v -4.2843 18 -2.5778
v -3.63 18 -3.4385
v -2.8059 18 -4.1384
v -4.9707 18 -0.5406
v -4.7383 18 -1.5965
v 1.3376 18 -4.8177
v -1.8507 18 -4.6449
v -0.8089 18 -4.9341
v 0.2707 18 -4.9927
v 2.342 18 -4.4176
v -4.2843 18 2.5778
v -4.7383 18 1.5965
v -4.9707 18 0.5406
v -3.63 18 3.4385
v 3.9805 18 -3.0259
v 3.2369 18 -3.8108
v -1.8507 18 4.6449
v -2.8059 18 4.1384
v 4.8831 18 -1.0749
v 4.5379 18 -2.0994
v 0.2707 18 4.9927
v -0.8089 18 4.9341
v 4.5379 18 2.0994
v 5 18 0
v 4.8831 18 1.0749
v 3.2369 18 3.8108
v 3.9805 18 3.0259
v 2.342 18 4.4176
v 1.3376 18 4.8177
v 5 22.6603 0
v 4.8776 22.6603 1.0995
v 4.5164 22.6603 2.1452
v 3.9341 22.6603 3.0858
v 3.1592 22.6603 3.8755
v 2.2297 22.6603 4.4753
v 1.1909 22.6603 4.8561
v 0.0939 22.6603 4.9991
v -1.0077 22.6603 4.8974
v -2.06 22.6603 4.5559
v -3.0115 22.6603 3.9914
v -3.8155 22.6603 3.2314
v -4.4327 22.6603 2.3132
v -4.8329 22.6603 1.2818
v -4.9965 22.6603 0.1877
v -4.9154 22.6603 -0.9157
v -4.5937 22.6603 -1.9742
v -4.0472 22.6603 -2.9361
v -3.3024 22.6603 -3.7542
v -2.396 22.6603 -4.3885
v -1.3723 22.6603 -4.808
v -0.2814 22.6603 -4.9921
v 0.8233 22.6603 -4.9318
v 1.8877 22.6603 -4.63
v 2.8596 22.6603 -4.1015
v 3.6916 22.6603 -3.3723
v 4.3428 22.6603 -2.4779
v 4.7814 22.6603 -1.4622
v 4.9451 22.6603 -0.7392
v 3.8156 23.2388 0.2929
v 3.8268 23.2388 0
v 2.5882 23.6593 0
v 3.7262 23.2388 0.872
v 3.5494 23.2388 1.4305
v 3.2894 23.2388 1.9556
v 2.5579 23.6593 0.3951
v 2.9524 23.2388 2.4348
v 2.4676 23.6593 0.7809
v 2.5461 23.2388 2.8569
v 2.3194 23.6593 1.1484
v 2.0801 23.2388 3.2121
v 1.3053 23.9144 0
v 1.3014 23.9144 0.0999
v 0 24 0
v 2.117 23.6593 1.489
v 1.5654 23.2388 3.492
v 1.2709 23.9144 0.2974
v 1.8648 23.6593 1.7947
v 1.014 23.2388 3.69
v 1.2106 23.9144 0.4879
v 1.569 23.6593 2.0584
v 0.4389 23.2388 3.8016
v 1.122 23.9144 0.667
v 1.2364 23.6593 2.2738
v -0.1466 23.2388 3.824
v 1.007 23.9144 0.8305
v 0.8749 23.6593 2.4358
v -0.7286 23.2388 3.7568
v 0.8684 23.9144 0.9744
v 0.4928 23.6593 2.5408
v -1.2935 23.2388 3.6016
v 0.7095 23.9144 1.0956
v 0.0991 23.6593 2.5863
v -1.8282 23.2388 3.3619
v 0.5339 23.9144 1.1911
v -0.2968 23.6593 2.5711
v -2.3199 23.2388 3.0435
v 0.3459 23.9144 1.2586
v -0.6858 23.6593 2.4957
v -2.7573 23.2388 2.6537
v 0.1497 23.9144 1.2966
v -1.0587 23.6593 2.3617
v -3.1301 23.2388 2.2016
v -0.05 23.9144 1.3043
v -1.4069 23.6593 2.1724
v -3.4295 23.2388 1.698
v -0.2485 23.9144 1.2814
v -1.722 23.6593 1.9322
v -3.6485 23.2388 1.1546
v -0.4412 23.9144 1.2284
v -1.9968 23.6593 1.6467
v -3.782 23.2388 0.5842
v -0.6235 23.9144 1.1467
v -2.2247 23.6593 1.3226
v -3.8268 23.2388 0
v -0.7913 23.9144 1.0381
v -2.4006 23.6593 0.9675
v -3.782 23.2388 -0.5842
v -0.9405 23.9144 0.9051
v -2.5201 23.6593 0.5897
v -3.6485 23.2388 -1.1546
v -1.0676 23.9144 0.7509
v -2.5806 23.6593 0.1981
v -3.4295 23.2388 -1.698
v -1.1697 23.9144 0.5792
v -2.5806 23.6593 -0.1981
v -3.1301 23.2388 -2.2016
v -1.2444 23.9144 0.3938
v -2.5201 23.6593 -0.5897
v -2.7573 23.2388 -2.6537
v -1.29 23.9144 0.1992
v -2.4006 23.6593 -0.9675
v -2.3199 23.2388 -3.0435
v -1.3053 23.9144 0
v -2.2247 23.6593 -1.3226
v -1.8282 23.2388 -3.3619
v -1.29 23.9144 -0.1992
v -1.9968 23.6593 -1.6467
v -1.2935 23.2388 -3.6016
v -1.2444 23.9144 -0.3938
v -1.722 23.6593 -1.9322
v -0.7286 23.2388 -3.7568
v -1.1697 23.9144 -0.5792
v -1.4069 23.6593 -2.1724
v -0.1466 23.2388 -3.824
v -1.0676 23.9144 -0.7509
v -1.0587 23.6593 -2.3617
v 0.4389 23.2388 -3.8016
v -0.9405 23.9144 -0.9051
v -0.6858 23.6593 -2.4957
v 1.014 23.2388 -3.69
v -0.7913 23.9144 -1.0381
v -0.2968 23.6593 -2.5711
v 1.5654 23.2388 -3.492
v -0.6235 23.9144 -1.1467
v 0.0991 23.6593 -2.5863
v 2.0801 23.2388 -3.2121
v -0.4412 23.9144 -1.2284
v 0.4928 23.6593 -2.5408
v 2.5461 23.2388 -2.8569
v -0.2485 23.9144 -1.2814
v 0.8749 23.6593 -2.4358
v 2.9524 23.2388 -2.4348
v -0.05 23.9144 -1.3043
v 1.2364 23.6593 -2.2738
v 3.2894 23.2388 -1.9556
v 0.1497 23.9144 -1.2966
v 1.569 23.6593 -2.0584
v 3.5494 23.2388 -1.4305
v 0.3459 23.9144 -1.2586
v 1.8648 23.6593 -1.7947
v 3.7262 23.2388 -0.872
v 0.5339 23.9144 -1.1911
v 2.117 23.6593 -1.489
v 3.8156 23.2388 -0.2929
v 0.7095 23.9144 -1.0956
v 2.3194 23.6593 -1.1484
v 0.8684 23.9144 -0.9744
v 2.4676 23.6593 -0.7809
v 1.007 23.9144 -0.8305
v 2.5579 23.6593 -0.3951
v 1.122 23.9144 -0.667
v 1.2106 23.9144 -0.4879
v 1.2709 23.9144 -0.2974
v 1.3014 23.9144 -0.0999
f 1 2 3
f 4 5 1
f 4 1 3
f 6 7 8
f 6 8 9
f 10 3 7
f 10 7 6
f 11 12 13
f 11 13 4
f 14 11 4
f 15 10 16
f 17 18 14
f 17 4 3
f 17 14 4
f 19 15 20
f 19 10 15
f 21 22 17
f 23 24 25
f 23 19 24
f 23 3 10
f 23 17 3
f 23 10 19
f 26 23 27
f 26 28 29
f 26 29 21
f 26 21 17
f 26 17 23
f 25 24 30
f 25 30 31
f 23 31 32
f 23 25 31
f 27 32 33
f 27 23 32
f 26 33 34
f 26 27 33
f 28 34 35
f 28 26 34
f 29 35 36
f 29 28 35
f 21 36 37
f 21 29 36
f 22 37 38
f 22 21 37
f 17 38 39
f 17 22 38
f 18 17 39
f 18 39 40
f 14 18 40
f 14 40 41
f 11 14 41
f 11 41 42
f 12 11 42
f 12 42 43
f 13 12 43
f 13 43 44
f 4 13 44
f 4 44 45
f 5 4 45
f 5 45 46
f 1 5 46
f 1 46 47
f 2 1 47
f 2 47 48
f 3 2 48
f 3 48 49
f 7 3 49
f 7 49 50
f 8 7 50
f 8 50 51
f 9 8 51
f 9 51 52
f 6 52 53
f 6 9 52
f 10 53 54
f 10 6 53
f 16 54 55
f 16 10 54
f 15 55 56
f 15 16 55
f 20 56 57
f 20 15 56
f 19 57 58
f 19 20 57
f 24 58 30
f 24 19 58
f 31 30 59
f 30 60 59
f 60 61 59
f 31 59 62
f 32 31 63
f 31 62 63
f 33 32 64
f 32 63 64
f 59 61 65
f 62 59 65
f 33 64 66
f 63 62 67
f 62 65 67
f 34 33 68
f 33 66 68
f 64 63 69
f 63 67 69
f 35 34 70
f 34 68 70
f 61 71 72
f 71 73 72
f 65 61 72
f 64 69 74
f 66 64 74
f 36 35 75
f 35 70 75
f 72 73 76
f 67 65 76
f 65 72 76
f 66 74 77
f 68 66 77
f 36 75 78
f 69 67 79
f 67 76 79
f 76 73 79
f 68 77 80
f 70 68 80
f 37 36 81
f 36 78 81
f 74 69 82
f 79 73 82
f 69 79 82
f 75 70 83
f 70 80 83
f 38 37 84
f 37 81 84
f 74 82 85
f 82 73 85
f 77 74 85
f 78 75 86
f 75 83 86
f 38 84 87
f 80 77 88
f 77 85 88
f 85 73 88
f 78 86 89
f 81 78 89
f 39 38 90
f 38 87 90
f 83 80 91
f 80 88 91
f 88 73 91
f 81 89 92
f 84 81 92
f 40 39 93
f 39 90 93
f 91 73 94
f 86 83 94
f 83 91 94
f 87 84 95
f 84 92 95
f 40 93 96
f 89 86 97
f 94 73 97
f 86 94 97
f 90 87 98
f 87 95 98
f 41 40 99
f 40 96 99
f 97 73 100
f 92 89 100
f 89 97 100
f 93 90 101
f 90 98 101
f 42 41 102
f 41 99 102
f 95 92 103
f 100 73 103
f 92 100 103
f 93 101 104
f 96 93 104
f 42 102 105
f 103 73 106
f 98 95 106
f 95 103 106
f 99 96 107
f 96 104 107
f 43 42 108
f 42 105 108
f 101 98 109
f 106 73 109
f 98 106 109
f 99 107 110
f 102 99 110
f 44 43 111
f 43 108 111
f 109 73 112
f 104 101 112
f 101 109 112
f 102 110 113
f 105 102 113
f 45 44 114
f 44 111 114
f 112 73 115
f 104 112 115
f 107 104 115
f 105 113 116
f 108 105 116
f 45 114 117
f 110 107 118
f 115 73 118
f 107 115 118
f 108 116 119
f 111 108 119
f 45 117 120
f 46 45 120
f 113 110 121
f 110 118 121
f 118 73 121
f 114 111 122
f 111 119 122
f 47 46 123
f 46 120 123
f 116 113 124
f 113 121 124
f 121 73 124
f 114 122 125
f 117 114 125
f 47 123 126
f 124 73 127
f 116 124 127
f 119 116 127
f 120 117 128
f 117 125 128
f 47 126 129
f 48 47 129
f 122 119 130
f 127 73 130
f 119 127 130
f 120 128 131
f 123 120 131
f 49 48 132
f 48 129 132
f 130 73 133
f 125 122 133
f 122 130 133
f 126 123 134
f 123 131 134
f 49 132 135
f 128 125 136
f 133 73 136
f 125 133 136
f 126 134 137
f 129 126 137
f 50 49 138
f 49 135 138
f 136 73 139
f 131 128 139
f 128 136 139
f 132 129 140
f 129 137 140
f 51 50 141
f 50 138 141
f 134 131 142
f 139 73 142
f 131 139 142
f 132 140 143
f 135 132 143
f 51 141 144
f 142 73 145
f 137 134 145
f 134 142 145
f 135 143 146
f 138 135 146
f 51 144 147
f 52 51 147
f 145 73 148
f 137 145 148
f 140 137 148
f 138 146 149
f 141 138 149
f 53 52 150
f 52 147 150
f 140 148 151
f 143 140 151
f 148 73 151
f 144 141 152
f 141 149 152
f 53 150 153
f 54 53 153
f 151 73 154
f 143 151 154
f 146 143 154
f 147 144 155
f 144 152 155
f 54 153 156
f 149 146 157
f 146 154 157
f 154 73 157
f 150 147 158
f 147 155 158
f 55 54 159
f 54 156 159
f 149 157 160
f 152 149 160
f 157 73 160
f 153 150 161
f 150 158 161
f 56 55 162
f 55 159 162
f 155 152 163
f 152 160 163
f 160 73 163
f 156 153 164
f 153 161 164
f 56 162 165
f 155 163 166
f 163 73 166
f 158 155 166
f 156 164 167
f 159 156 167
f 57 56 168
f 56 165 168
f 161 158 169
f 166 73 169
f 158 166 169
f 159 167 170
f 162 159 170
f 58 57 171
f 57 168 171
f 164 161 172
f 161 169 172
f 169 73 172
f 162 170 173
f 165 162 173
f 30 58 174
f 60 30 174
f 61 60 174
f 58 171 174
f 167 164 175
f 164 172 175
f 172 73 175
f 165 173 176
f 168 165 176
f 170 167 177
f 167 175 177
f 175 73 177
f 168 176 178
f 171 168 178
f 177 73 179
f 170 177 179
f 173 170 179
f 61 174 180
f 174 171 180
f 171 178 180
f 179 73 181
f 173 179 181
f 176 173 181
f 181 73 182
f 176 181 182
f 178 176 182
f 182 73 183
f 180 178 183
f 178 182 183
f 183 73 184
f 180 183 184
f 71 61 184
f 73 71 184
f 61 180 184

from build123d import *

# Parameters (mm, degrees)
SKETCH2_R           = 5
BOSS_EXTRUDE1_DEPTH = 8
SKETCH4_R           = 23.702642413
SKETCH4_R_2         = 5
CUT_EXTRUDE1_DEPTH  = 28
SKETCH5_R           = 5
CUT_EXTRUDE2_DEPTH  = 18


with BuildPart() as part:
    # Sketch2 → Boss-Extrude1 (new body)
    with BuildSketch(Plane(origin=(0, 0, 0), x_dir=(1, 0, 0), z_dir=(0, 1, 0))):
        Circle(SKETCH2_R)
    extrude(amount=BOSS_EXTRUDE1_DEPTH)

    # Sketch3 one side → Revolve1 (revolve)
    with BuildSketch(Plane.XY):
        with BuildLine():
            ThreePointArc((0, 4), (7.071067812, 6.928932188), (10, 14))
            ThreePointArc((10, 14), (7.071067812, 21.071067812), (0, 24))
            Line((0, 24), (0, 4))
        make_face()
    revolve(axis=Axis((0, 24, 0), (0, -1, 0)))

    # Sketch4 → Cut-Extrude1 (cut)
    with BuildSketch(Plane.XZ):
        Circle(SKETCH4_R)
        Circle(SKETCH4_R_2, mode=Mode.SUBTRACT)
    extrude(amount=-CUT_EXTRUDE1_DEPTH, mode=Mode.SUBTRACT)

    # Sketch5 → Cut-Extrude2 (cut)
    with BuildSketch(Plane.XZ):
        Circle(SKETCH5_R)
    extrude(amount=-CUT_EXTRUDE2_DEPTH, mode=Mode.SUBTRACT)


solid = part.part
